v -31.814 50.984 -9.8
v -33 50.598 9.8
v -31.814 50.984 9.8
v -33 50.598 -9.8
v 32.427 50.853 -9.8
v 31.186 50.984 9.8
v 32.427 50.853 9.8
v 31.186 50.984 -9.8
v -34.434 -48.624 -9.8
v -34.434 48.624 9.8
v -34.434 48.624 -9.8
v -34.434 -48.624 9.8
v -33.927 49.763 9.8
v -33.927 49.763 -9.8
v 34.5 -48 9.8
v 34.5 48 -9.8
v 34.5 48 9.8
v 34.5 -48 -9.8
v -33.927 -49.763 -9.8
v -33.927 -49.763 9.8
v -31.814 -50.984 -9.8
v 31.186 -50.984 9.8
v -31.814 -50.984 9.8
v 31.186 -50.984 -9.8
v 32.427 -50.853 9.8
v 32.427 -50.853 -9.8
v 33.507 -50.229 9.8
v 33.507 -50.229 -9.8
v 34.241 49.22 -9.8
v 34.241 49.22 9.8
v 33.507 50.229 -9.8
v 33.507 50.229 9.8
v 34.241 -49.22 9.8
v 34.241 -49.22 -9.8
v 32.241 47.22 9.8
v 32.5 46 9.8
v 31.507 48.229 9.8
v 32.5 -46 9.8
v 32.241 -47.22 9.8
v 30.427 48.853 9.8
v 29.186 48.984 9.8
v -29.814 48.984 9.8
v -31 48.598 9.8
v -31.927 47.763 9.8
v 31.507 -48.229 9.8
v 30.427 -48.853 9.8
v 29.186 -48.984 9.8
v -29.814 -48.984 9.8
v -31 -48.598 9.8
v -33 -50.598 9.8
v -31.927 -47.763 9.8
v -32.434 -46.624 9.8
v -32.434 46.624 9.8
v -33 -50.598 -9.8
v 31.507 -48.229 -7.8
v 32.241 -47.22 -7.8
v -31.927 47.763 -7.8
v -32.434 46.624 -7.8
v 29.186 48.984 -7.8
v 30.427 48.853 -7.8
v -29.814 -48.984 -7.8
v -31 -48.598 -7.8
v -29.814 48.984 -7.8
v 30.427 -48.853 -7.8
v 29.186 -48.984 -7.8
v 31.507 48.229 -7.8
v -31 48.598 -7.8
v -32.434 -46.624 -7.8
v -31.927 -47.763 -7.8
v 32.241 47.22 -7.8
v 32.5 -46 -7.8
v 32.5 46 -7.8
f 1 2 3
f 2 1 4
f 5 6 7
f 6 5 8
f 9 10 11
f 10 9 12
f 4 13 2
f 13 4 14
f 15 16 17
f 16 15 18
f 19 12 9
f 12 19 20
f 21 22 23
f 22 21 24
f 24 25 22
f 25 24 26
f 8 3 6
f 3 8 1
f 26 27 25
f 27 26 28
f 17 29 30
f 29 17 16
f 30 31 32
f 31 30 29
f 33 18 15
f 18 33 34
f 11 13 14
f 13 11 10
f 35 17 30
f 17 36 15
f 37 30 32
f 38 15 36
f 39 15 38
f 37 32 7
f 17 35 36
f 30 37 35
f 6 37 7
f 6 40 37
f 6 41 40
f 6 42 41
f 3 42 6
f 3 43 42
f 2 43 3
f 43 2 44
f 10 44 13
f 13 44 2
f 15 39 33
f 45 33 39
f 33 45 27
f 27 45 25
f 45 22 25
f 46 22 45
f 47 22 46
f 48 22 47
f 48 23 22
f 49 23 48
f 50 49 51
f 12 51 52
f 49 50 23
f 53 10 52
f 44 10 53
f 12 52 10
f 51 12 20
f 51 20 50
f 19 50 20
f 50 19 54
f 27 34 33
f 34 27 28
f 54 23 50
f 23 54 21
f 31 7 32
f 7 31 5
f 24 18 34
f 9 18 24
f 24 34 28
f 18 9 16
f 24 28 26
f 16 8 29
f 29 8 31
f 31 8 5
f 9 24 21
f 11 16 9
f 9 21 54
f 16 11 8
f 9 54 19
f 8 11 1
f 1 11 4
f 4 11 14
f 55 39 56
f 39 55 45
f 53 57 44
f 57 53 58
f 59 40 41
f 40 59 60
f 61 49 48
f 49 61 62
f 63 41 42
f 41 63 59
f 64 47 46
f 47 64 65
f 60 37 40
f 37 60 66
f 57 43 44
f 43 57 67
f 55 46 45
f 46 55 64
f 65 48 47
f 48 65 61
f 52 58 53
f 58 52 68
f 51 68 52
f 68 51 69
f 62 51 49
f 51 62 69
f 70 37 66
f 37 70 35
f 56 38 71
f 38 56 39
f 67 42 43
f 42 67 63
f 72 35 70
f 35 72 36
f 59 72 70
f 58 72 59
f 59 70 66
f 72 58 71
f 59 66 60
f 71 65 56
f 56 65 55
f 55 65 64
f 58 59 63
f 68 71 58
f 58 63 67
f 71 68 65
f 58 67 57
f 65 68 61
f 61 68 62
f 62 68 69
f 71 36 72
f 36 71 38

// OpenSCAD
function card_size_by_type(type) =
    // units in mm
    (type=="mini_usa")?      [41,63]:   (type=="41x63")?   [41,63]:
    (type=="mini_chimera")?  [43,65]:   (type=="43x65")?   [43,65]:
    (type=="mini_euro")?     [45,68]:   (type=="45x68")?   [45,68]:   (type=="TTR")?         [45,68]:
    (type=="std_usa")?       [56,87]:   (type=="56x87")?   [56,87]:   (type=="Bang!")?       [56,87]:
    (type=="chimera")?       [57.5,89]: (type=="57.5x89")? [57.5,89]: (type=="FFG")?         [57.5,89]:
    (type=="euro")?          [59,92]:   (type=="59x92")?   [59,92]:   (type=="Dominion")?    [59,92]:
    (type=="std")?           [63.5,88]: (type=="63.5x88")? [63.5,88]: (type=="MTG")?         [63.5,88]:
    (type=="magnum_copper")? [65,100]:  (type=="65x100")?  [65,100]:  (type=="7 Wonders")?   [65,100]:
    (type=="magnum_space")?  [61,103]:  (type=="61x103")?  [61,103]:  (type=="Space Alert")? [61,103]:
    (type=="magnum_silver")? [70,110]:  (type=="70x110")?  [70,110]:  (type=="Lost Cities")? [70,110]:
    (type=="magnum_gold")?   [80,120]:  (type=="80x120")?  [80,120]:  (type=="Dixit")?       [80,120]:
    (type=="french_tarot")?  [61,112]:  (type=="61x112")?  [61,112]:
    (type=="small_square")?  [70,70]:   (type=="70x70")?   [70,70]:
    (type=="medium_square")? [80,80]:   (type=="80x80")?   [80,80]:
    (type=="large_square")?  [90,90]:   (type=="90x90")?   [90,90]:
    [undef, undef];

all_types= [
    "mini_usa",
    "mini_chimera",
    "mini_euro",
    "std_usa",
    "chimera",
    "euro",
    "std",
    "magnum_copper",
    "magnum_space",
    "magnum_silver",
    "magnum_gold",
    "french_tarot",
    "small_square",
    "medium_square",
    "large_square"
];

module cards_holder_by_size(sleeve_width, sleeve_length, deck_depth, center=true) {
    // deck_depth: taking into account sleeves!
    space = 2;
    walls = 2;
    rounding = 3;
    minko_height = 1;
    eps = 1;

    module rounded_cube(x, y, z, center=true) {
        $fn = 15;
        cube_width = x-2*rounding;
        cube_length = y-2*rounding;
        cube_depth = z-minko_height;
        dx = center?0:x/2;
        dy = center?0:y/2;
        dz = center?0:z/2;
        translate([dx, dy, dz]) minkowski() {
            cube([cube_width, cube_length, cube_depth], center=true);
            cylinder(minko_height, rounding, rounding, center=true);
        }
    }

    hole_width = sleeve_width+2*space;
    hole_length = sleeve_length+2*space;
    hole_depth = deck_depth+space;
    outer_width = hole_width+2*walls;
    outer_length = hole_length+2*walls;
    outer_depth = hole_depth+walls;
    dx = center?0:outer_width/2;
    dy = center?0:outer_length/2;
    dz = center?0:outer_depth/2;
    translate([dx, dy, dz]) difference() {
        rounded_cube(outer_width, outer_length, outer_depth, center=true);
        translate([0, 0, (walls+eps)/2]) rounded_cube(hole_width, hole_length, hole_depth+eps, center=true);
    }
}

module cards_holder_by_type(type, count=52, card_thickness=0.1, center=true) {
    sleeve_extra = 2;
    sleeve_thickness = 0.2;
    card_size = card_size_by_type(type);
    cards_holder_by_size(card_size[0]+sleeve_extra, card_size[1]+sleeve_extra, count*(card_thickness+sleeve_thickness), center=center);
}

!cards_holder_by_type("euro");

for (i = [1-1:len(all_types)-1]) {
    translate([100*i, 0, 0]) {
        cards_holder_by_type(all_types[i], center=false);
        translate([5, -15, 0]) text(all_types[i], size=8);
    }
}
